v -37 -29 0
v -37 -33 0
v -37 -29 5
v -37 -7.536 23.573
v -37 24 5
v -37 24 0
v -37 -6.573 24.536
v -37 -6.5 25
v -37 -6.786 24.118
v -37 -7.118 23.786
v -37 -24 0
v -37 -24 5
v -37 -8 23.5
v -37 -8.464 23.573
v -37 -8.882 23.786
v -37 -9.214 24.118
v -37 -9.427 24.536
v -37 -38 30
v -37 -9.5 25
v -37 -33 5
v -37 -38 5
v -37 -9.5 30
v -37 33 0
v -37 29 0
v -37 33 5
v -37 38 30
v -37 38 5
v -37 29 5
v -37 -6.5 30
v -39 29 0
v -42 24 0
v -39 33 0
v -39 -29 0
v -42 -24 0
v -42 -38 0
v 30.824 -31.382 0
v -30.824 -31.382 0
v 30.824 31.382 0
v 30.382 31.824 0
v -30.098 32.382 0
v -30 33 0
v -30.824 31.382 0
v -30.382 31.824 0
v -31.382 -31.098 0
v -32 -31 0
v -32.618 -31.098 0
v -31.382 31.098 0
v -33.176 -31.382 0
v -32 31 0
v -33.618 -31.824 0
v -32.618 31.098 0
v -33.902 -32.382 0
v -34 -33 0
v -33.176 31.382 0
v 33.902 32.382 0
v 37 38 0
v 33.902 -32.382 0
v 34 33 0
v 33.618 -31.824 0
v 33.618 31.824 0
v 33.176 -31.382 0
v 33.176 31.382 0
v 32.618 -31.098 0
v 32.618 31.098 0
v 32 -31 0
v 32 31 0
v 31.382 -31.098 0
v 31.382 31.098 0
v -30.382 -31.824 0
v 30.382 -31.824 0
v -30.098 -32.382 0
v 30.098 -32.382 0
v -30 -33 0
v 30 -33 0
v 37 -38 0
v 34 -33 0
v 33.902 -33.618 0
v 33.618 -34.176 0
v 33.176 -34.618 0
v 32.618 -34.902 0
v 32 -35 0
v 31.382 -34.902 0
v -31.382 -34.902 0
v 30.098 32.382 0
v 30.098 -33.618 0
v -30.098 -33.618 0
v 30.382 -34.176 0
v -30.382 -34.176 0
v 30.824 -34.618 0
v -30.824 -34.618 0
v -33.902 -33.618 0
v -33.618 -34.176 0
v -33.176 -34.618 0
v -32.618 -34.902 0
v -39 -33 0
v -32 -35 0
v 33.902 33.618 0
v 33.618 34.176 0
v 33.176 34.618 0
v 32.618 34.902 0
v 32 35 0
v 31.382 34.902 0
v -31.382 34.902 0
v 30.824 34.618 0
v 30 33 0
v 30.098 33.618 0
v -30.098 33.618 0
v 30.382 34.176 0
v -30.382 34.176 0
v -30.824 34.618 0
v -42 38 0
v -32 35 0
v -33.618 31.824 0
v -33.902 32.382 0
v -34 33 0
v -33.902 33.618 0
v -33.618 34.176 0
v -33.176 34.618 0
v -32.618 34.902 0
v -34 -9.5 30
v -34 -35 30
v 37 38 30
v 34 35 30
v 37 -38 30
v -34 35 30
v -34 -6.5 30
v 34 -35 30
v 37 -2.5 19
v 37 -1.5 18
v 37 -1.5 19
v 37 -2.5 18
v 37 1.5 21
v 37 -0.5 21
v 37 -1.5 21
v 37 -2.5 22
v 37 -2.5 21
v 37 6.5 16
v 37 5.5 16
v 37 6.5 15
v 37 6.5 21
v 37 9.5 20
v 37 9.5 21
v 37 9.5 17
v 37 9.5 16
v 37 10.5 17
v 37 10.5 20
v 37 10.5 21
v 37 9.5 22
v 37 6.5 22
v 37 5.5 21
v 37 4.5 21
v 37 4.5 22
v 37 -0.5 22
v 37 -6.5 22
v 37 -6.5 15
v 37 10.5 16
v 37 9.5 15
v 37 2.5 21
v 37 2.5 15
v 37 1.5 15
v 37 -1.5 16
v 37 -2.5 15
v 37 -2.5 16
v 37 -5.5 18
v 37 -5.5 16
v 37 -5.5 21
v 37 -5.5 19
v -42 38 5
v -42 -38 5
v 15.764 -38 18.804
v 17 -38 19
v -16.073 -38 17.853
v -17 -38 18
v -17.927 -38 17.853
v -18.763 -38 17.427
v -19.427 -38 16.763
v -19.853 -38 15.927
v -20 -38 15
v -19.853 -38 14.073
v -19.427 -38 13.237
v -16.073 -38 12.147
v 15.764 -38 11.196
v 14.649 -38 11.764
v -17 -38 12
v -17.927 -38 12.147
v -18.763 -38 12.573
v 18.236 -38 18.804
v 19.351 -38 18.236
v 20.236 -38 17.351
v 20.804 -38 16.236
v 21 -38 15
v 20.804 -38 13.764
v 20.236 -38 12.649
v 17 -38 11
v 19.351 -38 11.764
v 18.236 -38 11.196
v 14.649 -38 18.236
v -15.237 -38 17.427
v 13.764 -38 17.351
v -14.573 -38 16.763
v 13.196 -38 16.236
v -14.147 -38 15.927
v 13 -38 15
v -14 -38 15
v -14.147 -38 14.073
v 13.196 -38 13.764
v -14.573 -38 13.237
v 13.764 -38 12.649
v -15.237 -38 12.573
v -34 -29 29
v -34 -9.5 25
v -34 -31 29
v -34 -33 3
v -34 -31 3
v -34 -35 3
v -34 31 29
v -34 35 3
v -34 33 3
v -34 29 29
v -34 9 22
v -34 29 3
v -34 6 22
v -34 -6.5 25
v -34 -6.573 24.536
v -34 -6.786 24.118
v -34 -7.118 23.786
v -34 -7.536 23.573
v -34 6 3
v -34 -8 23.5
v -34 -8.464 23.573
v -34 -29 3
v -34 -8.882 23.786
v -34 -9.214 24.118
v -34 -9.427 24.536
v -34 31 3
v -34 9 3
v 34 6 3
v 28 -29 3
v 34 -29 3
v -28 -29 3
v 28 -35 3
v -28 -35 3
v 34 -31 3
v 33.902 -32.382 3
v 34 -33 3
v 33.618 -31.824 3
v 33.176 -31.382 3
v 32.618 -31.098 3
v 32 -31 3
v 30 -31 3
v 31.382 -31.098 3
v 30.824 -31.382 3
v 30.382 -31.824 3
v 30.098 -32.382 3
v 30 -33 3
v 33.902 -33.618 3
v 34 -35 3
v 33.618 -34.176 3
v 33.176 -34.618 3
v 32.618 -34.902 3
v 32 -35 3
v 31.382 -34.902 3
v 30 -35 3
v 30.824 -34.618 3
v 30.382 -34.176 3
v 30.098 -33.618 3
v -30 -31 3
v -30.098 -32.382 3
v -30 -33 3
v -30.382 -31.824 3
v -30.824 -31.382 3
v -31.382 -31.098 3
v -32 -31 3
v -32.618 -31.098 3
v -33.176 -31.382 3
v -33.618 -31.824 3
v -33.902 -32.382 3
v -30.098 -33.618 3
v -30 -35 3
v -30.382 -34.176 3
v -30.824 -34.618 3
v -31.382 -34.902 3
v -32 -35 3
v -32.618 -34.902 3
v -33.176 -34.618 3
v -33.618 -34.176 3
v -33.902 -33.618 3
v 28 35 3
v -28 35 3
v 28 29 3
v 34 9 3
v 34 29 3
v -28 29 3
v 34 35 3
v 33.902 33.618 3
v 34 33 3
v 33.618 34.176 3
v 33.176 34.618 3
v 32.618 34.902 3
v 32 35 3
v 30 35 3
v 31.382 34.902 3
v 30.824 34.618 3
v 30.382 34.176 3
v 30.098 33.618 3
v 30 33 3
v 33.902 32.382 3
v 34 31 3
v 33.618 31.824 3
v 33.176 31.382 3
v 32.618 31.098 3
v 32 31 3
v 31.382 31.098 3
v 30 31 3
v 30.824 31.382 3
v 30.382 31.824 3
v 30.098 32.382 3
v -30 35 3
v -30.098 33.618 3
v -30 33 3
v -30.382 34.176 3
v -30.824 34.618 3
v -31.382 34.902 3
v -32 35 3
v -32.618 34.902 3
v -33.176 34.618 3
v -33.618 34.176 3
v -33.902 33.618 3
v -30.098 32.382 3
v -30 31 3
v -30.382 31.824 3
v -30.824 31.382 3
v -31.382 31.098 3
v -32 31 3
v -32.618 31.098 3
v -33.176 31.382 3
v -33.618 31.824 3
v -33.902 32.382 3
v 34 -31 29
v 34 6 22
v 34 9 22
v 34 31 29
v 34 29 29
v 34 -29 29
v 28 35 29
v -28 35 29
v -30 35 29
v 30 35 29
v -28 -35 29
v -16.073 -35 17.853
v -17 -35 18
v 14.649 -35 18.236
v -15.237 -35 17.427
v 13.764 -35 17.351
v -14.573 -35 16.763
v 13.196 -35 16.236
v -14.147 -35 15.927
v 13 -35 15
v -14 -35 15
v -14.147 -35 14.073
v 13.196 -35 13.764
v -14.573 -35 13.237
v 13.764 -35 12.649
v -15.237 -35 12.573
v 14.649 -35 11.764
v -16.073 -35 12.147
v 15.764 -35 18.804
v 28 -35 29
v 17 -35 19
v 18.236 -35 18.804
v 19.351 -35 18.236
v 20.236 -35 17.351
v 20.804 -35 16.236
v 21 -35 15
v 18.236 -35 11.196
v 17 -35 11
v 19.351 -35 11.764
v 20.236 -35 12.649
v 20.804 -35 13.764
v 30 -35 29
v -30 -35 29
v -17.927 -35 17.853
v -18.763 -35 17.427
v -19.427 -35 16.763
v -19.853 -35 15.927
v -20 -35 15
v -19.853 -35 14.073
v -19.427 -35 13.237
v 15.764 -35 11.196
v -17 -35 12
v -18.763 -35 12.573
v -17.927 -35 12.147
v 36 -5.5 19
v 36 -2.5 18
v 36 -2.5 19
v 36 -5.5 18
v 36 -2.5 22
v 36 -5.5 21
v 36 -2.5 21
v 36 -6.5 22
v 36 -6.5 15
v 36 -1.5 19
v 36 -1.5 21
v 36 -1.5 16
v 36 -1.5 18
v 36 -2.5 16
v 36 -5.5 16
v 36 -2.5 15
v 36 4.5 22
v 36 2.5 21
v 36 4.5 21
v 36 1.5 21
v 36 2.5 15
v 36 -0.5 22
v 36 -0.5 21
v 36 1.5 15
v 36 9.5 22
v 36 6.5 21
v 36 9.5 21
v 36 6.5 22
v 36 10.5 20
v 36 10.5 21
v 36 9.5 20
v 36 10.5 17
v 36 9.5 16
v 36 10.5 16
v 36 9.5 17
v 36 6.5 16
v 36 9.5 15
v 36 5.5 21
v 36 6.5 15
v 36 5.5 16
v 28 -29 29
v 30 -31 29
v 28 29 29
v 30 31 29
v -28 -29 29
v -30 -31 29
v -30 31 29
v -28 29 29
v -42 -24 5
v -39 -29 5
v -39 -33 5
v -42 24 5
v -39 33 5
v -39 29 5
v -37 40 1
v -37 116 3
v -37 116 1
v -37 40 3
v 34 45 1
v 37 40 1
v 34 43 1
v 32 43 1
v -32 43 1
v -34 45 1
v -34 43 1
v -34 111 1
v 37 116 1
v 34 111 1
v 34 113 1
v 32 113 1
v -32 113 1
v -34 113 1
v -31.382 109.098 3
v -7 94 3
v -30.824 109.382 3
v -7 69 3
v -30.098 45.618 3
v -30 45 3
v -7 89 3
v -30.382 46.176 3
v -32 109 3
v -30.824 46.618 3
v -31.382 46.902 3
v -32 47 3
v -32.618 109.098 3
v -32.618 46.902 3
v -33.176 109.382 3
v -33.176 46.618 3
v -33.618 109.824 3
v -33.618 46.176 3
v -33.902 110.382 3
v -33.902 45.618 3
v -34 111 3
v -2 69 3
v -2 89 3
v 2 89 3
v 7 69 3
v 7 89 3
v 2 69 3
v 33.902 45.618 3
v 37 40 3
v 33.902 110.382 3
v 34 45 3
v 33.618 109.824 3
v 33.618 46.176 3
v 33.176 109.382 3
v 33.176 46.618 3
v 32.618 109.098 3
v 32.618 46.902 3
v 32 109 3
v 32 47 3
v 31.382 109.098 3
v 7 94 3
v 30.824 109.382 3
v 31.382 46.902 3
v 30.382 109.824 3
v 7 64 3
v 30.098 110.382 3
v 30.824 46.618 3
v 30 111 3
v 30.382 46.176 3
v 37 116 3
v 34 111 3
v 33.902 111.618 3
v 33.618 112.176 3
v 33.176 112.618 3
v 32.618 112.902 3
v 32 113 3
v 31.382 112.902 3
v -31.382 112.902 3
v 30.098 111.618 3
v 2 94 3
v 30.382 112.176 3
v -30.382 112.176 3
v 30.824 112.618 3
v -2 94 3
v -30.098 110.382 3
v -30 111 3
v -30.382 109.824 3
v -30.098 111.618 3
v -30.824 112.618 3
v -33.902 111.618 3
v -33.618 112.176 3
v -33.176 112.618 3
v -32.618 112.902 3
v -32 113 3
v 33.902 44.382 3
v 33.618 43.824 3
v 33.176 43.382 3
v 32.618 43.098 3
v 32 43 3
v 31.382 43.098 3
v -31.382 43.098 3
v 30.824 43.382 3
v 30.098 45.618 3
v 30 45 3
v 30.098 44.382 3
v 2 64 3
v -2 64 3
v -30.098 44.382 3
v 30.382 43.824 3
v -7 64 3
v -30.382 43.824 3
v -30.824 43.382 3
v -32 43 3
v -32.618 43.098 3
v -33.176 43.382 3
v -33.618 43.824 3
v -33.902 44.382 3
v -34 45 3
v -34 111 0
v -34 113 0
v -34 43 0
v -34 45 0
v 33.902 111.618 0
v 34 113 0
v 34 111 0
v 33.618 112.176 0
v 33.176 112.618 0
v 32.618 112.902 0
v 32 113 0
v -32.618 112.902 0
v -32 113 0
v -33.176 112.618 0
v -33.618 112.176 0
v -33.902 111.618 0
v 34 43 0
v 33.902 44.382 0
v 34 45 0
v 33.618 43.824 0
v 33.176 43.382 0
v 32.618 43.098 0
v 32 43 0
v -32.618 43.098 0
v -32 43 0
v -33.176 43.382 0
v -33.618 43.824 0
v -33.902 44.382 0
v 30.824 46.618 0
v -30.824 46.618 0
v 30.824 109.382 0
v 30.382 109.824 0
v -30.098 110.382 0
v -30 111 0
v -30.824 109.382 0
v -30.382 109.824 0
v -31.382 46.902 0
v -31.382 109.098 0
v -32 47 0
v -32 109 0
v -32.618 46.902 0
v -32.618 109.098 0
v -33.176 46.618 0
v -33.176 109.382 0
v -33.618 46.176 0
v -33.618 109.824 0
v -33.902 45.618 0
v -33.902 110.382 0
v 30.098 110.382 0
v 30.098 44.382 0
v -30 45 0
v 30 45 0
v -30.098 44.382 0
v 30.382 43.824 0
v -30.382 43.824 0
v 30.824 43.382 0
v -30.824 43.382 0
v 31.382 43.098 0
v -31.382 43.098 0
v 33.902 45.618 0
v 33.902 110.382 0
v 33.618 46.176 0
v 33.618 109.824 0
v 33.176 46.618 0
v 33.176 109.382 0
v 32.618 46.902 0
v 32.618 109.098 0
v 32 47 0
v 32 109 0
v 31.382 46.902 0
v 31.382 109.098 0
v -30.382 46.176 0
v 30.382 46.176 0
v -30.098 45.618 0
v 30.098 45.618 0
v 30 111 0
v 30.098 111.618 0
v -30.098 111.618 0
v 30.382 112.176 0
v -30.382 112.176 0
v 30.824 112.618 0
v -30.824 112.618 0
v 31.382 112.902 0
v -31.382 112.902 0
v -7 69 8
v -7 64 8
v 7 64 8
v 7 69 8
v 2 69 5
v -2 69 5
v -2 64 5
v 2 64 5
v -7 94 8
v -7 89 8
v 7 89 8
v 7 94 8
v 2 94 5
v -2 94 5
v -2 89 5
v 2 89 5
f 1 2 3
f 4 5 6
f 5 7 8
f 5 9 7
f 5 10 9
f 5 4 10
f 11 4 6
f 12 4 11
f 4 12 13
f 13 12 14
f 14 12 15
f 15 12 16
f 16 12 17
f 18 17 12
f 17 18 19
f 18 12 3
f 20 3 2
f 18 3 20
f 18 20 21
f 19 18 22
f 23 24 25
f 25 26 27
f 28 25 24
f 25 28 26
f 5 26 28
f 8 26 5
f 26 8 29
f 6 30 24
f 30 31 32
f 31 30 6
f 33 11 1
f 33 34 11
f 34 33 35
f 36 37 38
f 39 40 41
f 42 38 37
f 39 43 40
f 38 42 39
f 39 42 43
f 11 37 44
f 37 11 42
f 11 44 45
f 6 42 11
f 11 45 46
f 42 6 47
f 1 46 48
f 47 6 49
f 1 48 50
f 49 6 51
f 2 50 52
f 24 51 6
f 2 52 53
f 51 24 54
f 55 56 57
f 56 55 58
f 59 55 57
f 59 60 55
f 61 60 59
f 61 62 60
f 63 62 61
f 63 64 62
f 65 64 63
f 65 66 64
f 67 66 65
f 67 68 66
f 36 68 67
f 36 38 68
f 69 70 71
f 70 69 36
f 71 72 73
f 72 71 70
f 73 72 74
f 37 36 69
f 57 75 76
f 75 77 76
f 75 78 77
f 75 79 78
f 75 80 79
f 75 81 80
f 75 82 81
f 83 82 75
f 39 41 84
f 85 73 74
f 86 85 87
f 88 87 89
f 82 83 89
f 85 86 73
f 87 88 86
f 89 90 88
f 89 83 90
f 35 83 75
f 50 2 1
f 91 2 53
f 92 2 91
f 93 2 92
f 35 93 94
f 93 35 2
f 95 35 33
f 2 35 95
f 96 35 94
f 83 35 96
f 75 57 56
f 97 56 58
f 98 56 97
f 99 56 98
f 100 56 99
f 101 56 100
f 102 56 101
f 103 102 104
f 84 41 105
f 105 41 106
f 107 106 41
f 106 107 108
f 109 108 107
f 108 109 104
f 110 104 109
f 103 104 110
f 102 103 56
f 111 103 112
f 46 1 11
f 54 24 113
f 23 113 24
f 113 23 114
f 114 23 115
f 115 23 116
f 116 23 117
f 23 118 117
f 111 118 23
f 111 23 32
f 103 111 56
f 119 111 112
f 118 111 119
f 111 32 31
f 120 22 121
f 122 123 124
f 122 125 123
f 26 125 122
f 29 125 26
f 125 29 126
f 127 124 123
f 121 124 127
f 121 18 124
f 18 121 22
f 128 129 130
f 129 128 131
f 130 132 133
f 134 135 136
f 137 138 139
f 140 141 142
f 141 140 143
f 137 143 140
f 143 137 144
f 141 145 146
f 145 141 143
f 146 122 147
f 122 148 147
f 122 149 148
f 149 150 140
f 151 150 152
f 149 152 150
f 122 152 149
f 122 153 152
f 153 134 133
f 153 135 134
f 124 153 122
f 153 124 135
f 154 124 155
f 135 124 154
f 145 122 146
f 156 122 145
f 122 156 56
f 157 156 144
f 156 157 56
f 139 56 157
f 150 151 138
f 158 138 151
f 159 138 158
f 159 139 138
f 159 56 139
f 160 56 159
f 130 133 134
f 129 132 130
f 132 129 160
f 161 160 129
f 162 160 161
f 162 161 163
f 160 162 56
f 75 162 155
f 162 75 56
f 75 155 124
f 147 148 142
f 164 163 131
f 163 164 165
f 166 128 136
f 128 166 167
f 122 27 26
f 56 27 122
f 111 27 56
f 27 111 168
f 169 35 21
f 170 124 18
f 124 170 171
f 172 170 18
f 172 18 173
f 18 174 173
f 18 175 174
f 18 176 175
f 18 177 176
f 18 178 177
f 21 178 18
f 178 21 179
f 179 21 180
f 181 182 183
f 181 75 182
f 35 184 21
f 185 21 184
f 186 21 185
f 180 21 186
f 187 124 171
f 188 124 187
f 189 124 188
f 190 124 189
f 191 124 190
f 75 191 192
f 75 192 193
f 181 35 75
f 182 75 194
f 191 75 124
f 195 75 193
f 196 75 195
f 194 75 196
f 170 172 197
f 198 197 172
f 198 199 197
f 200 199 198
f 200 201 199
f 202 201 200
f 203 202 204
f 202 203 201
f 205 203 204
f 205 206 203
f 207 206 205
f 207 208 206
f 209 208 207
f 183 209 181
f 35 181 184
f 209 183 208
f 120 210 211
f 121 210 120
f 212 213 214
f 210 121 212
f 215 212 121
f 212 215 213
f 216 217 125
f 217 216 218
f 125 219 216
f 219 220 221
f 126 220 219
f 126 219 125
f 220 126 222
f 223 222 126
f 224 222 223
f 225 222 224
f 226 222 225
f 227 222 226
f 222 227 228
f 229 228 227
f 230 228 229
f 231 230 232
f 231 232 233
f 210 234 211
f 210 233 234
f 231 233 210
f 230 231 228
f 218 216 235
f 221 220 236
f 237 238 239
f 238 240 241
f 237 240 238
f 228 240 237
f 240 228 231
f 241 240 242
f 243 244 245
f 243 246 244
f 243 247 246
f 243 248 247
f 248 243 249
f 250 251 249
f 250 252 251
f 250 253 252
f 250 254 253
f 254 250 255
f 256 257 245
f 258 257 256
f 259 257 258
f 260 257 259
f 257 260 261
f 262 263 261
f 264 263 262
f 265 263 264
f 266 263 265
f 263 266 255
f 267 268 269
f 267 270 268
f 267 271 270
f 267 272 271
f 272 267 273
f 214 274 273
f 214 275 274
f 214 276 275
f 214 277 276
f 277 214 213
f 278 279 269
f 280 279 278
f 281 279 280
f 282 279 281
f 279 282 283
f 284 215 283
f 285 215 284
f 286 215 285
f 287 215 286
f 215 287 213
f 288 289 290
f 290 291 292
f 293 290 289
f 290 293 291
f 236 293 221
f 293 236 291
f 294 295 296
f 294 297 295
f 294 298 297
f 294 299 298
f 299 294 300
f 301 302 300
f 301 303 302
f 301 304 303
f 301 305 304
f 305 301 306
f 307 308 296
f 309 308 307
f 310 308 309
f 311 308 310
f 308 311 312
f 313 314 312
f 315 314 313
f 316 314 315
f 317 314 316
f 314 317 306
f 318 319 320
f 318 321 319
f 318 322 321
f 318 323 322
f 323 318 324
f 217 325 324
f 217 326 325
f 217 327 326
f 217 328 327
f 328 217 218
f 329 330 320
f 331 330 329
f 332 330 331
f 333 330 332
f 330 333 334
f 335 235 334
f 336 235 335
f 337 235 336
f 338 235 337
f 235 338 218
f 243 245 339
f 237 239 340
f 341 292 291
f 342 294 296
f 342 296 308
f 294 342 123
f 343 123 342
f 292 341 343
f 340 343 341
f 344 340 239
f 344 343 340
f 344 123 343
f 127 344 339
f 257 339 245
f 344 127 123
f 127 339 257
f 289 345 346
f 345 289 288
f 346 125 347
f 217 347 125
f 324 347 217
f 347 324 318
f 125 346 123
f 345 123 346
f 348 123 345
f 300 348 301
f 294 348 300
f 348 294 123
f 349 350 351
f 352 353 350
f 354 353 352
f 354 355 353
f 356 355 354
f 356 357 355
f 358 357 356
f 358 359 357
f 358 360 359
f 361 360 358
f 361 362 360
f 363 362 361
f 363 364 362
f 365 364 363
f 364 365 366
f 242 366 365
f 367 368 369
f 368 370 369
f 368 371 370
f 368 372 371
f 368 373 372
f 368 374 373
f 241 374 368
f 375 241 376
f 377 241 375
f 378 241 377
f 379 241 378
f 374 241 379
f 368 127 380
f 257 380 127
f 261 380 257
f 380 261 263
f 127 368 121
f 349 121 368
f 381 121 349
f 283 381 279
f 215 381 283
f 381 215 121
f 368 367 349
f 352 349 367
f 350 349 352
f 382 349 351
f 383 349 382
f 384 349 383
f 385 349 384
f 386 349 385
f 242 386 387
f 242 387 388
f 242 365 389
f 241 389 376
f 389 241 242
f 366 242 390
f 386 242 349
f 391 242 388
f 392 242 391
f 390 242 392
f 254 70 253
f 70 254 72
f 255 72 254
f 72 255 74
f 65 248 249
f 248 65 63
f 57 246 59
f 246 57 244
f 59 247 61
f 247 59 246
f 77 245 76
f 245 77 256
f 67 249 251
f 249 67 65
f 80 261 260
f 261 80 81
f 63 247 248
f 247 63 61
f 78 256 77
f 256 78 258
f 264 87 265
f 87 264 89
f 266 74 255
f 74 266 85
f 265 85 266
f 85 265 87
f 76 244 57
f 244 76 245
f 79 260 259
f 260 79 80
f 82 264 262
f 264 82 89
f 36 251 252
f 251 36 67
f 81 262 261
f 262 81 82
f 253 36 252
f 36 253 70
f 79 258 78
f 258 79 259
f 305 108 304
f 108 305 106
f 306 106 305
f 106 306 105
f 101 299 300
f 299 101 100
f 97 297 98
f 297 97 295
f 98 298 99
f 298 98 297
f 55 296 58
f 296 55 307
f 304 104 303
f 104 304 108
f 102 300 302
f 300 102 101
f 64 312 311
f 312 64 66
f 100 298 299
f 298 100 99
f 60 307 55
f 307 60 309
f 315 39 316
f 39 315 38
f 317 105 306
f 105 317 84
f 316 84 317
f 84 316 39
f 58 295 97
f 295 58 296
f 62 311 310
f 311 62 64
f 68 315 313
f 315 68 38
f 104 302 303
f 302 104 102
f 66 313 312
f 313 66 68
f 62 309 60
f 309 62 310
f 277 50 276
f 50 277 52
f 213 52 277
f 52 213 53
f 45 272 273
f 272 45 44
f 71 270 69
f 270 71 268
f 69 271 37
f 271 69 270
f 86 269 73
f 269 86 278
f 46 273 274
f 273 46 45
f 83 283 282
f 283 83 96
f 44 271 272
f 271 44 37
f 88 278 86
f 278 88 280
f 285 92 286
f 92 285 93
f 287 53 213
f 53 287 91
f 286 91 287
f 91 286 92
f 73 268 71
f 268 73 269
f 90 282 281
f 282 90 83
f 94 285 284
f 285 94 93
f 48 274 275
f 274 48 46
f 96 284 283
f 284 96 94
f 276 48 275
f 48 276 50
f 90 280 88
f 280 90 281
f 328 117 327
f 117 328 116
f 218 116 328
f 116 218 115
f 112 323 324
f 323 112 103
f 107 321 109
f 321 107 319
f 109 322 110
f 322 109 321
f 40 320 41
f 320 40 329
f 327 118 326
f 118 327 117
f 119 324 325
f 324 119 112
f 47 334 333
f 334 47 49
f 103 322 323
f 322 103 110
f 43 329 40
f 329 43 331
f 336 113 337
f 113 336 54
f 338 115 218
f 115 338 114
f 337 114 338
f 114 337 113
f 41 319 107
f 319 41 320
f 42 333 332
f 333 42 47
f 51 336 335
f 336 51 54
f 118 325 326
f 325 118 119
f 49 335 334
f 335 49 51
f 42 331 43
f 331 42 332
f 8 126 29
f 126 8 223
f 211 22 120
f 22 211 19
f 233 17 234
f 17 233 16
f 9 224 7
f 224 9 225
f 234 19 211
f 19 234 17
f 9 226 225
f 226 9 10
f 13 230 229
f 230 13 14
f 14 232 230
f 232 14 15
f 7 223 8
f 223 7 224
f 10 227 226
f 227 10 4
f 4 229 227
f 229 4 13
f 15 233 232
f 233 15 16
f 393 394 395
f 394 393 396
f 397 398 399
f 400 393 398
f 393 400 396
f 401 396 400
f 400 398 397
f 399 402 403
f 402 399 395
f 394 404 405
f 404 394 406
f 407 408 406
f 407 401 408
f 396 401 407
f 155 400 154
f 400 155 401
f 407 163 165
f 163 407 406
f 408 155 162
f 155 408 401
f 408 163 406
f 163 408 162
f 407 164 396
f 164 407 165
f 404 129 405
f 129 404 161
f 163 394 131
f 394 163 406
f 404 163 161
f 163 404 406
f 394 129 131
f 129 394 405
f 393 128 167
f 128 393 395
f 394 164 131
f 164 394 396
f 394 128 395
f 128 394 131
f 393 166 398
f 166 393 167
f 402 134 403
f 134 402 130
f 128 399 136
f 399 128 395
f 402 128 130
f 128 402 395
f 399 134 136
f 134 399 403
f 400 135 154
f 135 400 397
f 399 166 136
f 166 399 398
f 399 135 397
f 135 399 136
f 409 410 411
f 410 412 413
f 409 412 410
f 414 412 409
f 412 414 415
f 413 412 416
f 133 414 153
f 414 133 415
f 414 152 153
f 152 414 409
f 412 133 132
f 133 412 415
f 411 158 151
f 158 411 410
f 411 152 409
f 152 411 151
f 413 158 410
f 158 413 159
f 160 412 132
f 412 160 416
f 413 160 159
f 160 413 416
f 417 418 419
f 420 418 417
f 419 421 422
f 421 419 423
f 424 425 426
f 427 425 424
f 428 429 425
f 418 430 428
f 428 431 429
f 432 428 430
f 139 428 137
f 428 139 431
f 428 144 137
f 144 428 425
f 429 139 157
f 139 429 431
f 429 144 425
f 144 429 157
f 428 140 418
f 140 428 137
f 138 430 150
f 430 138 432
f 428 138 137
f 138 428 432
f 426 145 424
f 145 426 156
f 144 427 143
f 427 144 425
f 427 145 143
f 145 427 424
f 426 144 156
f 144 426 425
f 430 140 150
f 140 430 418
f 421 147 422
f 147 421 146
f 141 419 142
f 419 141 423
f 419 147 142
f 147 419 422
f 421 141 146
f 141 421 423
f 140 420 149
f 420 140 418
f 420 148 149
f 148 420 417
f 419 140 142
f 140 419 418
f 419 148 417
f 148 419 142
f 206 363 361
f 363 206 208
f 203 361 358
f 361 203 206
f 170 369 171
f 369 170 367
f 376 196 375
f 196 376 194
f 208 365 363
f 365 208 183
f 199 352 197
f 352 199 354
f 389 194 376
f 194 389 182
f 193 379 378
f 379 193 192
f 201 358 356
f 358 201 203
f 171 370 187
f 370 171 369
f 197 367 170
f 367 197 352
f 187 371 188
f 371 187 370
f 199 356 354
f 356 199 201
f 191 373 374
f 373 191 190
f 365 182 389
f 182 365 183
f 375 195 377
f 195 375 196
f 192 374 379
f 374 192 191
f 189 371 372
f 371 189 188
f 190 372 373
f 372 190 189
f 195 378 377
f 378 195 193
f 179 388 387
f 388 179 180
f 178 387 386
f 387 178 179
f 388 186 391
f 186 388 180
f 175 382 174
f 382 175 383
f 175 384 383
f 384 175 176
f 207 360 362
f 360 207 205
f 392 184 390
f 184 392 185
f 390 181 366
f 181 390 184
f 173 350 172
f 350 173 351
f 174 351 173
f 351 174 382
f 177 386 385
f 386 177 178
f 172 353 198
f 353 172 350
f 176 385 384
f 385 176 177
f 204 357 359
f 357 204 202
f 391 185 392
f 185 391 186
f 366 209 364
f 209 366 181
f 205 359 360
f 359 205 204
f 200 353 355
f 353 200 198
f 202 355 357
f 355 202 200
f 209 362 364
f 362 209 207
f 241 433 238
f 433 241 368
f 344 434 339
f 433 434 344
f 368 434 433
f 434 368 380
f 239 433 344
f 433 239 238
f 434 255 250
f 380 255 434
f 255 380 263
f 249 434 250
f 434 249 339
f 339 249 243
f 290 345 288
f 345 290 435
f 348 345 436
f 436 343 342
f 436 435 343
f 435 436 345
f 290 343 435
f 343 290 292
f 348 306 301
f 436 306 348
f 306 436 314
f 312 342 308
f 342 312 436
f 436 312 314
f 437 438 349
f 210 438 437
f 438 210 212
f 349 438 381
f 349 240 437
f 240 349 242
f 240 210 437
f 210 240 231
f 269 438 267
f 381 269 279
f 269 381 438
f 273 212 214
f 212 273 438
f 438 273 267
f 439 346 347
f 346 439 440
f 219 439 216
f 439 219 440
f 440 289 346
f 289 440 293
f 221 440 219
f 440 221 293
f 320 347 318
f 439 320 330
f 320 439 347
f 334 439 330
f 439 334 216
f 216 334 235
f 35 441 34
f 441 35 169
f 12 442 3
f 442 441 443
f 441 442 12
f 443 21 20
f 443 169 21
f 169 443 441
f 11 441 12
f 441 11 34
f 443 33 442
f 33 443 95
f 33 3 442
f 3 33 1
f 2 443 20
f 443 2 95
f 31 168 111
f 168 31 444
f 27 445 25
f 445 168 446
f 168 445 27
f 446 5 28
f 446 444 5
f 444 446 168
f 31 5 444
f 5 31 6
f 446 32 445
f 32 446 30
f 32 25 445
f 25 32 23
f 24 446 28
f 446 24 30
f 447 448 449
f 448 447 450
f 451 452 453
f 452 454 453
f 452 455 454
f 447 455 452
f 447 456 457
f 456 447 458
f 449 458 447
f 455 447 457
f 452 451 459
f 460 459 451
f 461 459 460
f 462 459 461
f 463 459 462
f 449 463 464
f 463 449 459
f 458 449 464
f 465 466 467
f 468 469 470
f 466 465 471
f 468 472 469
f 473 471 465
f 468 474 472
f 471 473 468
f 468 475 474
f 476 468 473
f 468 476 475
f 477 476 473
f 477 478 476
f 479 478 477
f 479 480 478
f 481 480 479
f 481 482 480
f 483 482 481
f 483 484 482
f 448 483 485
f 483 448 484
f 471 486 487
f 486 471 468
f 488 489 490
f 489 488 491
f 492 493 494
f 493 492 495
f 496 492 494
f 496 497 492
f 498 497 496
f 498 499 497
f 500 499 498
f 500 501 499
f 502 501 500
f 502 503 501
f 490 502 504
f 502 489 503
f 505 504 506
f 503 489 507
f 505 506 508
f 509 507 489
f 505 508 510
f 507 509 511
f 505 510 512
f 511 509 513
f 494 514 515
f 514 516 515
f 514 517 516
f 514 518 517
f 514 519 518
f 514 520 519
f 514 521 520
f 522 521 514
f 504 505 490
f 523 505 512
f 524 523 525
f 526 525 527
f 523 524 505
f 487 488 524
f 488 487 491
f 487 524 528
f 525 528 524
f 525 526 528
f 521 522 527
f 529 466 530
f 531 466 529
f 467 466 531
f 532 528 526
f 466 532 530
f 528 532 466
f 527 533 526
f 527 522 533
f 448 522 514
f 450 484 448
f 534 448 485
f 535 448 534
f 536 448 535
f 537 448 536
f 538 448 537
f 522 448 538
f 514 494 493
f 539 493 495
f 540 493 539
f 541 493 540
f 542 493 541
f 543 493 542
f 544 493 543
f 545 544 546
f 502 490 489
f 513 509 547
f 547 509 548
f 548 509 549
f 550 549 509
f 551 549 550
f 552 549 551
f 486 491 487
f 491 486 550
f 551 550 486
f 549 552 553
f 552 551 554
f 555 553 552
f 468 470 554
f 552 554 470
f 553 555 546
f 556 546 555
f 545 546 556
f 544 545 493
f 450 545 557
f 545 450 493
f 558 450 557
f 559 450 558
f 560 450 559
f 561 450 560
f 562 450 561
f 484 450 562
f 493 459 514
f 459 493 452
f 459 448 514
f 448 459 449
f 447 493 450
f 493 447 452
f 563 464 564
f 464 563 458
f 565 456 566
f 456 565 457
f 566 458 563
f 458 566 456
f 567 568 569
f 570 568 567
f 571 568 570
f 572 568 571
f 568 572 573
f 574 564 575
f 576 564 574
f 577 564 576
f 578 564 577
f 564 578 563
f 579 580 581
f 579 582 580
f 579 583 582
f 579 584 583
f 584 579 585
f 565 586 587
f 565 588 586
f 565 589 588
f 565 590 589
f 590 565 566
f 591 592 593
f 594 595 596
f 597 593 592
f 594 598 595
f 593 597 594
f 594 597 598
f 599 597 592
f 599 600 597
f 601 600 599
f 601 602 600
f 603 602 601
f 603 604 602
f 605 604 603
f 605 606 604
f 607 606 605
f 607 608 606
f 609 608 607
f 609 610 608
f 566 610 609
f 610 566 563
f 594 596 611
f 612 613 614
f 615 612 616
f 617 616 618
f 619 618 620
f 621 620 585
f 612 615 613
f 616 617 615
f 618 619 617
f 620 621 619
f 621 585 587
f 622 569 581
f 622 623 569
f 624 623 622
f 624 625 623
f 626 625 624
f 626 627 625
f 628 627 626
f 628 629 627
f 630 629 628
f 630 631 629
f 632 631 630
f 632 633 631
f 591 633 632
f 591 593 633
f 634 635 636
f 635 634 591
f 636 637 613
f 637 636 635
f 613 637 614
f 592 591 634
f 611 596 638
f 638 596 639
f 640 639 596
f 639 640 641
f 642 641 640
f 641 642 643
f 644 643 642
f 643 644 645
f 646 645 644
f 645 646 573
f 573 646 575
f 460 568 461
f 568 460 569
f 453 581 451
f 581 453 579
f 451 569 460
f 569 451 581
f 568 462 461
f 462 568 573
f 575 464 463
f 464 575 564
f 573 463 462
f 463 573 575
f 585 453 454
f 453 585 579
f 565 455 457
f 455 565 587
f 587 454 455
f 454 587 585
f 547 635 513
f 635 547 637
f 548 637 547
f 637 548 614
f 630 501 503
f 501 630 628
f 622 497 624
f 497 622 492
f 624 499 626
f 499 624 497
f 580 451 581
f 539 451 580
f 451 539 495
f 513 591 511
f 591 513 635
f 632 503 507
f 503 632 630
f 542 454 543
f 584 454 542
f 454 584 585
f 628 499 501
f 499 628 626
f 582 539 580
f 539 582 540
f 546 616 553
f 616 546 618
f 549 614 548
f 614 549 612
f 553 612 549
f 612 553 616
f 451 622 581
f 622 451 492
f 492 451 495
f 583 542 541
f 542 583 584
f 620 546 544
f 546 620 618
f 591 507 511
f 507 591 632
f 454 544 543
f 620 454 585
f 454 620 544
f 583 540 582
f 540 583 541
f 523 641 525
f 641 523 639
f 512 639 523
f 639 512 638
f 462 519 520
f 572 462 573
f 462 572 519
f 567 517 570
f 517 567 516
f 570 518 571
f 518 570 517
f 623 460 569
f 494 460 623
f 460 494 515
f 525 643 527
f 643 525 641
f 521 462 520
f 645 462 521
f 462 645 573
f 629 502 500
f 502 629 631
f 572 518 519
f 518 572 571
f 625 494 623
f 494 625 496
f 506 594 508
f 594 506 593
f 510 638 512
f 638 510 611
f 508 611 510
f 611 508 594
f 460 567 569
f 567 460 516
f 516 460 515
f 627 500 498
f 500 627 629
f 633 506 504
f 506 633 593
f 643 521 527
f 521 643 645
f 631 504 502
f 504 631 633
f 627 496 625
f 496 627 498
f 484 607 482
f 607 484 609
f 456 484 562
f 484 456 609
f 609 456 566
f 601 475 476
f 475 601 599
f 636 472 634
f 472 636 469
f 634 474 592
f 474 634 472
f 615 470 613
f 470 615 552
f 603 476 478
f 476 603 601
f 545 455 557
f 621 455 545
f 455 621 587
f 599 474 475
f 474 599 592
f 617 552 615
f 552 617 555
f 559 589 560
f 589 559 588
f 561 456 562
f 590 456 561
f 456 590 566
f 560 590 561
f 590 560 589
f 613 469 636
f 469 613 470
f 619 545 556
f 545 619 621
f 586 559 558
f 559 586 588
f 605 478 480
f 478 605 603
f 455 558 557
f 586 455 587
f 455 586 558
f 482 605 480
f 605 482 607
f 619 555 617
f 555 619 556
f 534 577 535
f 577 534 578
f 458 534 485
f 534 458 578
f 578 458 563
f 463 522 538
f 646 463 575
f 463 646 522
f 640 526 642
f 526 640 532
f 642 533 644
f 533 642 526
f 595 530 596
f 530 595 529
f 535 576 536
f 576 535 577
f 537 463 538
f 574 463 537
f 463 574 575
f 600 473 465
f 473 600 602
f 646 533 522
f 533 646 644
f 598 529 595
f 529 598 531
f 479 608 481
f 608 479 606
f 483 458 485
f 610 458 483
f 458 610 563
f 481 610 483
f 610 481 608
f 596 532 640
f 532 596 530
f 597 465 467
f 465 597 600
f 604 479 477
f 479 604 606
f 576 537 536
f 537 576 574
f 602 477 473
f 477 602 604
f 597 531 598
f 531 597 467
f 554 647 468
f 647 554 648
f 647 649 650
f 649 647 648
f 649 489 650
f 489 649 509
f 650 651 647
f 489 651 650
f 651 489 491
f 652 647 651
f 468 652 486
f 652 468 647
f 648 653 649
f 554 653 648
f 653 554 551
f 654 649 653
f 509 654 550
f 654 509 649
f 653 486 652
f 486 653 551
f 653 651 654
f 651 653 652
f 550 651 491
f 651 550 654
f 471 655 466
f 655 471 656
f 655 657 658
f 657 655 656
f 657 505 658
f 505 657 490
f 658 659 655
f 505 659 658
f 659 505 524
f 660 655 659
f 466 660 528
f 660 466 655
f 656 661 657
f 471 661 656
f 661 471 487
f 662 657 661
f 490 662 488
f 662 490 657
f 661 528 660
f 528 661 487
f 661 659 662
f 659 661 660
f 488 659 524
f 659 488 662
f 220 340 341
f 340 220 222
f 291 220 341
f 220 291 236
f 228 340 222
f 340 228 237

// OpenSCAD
// file: text_generator.scad
module drawtext(text) {
	//Characters
	chars = " !\"#$%&'()*+,-./0123456789:;<=>?@ABCDEFGHIJKLMNOPQRSTUVWXYZ[\\]^_`abcdefghijklmnopqrstuvwxyz{|}";

	//Chracter table defining 5x7 characters
	//Adapted from: http://www.geocities.com/dinceraydin/djlcdsim/chartable.js
	char_table = [ [ 0, 0, 0, 0, 0, 0, 0],
                  [ 4, 0, 4, 4, 4, 4, 4],
                  [ 0, 0, 0, 0,10,10,10],
                  [10,10,31,10,31,10,10],
                  [ 4,30, 5,14,20,15, 4],
                  [ 3,19, 8, 4, 2,25,24],
                  [13,18,21, 8,20,18,12],
                  [ 0, 0, 0, 0, 8, 4,12],
                  [ 2, 4, 8, 8, 8, 4, 2],
                  [ 8, 4, 2, 2, 2, 4, 8],
                  [ 0, 4,21,14,21, 4, 0],
                  [ 0, 4, 4,31, 4, 4, 0],
                  [ 8, 4,12, 0, 0, 0, 0],
                  [ 0, 0, 0,31, 0, 0, 0],
                  [12,12, 0, 0, 0, 0, 0],
                  [ 0,16, 8, 4, 2, 1, 0],
                  [14,17,25,21,19,17,14],
                  [14, 4, 4, 4, 4,12, 4],
                  [31, 8, 4, 2, 1,17,14],
                  [14,17, 1, 2, 4, 2,31],
                  [ 2, 2,31,18,10, 6, 2],
                  [14,17, 1, 1,30,16,31],
                  [14,17,17,30,16, 8, 6],
                  [ 8, 8, 8, 4, 2, 1,31],
                  [14,17,17,14,17,17,14],
                  [12, 2, 1,15,17,17,14],
                  [ 0,12,12, 0,12,12, 0],
                  [ 8, 4,12, 0,12,12, 0],
                  [ 2, 4, 8,16, 8, 4, 2],
                  [ 0, 0,31, 0,31, 0, 0],
                  [16, 8, 4, 2, 4, 8,16],
                  [ 4, 0, 4, 2, 1,17,14],
                  [14,21,21,13, 1,17,14],
                  [17,17,31,17,17,17,14],
                  [30,17,17,30,17,17,30],
                  [14,17,16,16,16,17,14],
                  [30,17,17,17,17,17,30],
                  [31,16,16,30,16,16,31],
                  [16,16,16,30,16,16,31],
                  [15,17,17,23,16,17,14],
                  [17,17,17,31,17,17,17],
                  [14, 4, 4, 4, 4, 4,14],
                  [12,18, 2, 2, 2, 2, 7],
                  [17,18,20,24,20,18,17],
                  [31,16,16,16,16,16,16],
                  [17,17,17,21,21,27,17],
                  [17,17,19,21,25,17,17],
                  [14,17,17,17,17,17,14],
                  [16,16,16,30,17,17,30],
                  [13,18,21,17,17,17,14],
                  [17,18,20,30,17,17,30],
                  [30, 1, 1,14,16,16,15],
                  [ 4, 4, 4, 4, 4, 4,31],
                  [14,17,17,17,17,17,17],
                  [ 4,10,17,17,17,17,17],
                  [10,21,21,21,17,17,17],
                  [17,17,10, 4,10,17,17],
                  [ 4, 4, 4,10,17,17,17],
                  [31,16, 8, 4, 2, 1,31],
                  [14, 8, 8, 8, 8, 8,14],
                  [ 0, 1, 2, 4, 8,16, 0],
                  [14, 2, 2, 2, 2, 2,14],
                  [ 0, 0, 0, 0,17,10, 4],
                  [31, 0, 0, 0, 0, 0, 0],
                  [ 0, 0, 0, 0, 2, 4, 8],
                  [15,17,15, 1,14, 0, 0],
                  [30,17,17,25,22,16,16],
                  [14,17,16,16,14, 0, 0],
                  [15,17,17,19,13, 1, 1],
                  [14,16,31,17,14, 0, 0],
                  [ 8, 8, 8,28, 8, 9, 6],
                  [14, 1,15,17,15, 0, 0],
                  [17,17,17,25,22,16,16],
                  [14, 4, 4, 4,12, 0, 4],
                  [12,18, 2, 2, 2, 6, 2],
                  [18,20,24,20,18,16,16],
                  [14, 4, 4, 4, 4, 4,12],
                  [17,17,21,21,26, 0, 0],
                  [17,17,17,25,22, 0, 0],
                  [14,17,17,17,14, 0, 0],
                  [16,16,30,17,30, 0, 0],
                  [ 1, 1,15,19,13, 0, 0],
                  [16,16,16,25,22, 0, 0],
                  [30, 1,14,16,15, 0, 0],
                  [ 6, 9, 8, 8,28, 8, 8],
                  [13,19,17,17,17, 0, 0],
                  [ 4,10,17,17,17, 0, 0],
                  [10,21,21,17,17, 0, 0],
                  [17,10, 4,10,17, 0, 0],
                  [14, 1,15,17,17, 0, 0],
                  [31, 8, 4, 2,31, 0, 0],
                  [ 2, 4, 4, 8, 4, 4, 2],
                  [ 4, 4, 4, 4, 4, 4, 4],
                  [ 8, 4, 4, 2, 4, 4, 8] ];

	//Binary decode table
	dec_table = [ "00000", "00001", "00010", "00011", "00100", "00101",
  	            "00110", "00111", "01000", "01001", "01010", "01011",
  	            "01100", "01101", "01110", "01111", "10000", "10001",
  	            "10010", "10011", "10100", "10101", "10110", "10111",
	            "11000", "11001", "11010", "11011", "11100", "11101",
	            "11110", "11111" ];

	//Process string one character at a time
	for(itext = [0:len(text)-1]) {
		//Convert character to index
		ichar = search(text[itext],chars,1)[0];

        //Decode character - rows
        for(irow = [0:6]) {
            //Select value to draw from table
            val = dec_table[char_table[ichar][irow]];

            //Decode character - cols
            for(icol = [0:4]) {
                // Retrieve bit to draw
                bit = search(val[icol],"01",1)[0];

                if(bit) {
                    //Output cube
                    translate([icol + (6*itext), irow, 0])
                        cube([1.0001,1.0001,1]);
                }
            }
        }
	}
}
// main file
include <text_generator.scad>;

profile = 0;
showComponents = 0;

// sizes in mm
width = 74;
height = 76;
depth = 30; 
thickness = 3;
coverThickness = 2;
coverDepth = 1;
coverOffset = 0;
holeRadius = 2;

mountWidth = 14;
mountHeigth = 6;
mounthDepth = 5;

batteryHolderWidth = 55;
batteryHolderSize = 25;

controlsOffset = 20;
ledRadius = 4;//2.5;
ledXPosition = controlsOffset;
switchRadius = 3;
switchXPosition = width - controlsOffset;

holeHeigth = thickness;
bottomHoleOffset = depth - thickness;
holePosition = 2 * thickness - 1;
widthInside = width - (2 * thickness);
heightInside = height - (2 * thickness);

module box() {
    difference() {
        cube([width, height, depth], false);
        translate([thickness, thickness, -thickness]) {
            cube([widthInside, heightInside, depth], false);
        }
    }
}

module hole(x, y, z) {
    translate([x, y, z]) {
        cylinder(holeHeigth, holeRadius, holeRadius,$fn=20, false);
    }
}

module holes(bottomOffset) {
    hole(holePosition, holePosition, bottomOffset);
    hole(holePosition, heightInside + 1, bottomOffset);
    hole(widthInside + 1, holePosition, bottomOffset);
    hole(widthInside + 1, heightInside + 1, bottomOffset);
}

module holeBox(x, y) {
    translate([x, y, 1]) {
        difference() {
            cube([8, 8, depth - 1 - thickness]);
            translate([2, 2, 0]) {
                cube([4, 4, depth - 1 - thickness]);
            }
        }
    }
}

module holeBoxes() {
    holeBox(1, 1);
    holeBox(1, heightInside - thickness);
    holeBox(widthInside - thickness, 1);
    holeBox(widthInside - thickness, heightInside - thickness);
}

module cover() {
    translate([0, 0, coverOffset]) {
        cube([width, height, coverThickness], false);
        translate([thickness, thickness, coverThickness]) {
            cube([widthInside, heightInside, coverDepth], false);
        }
    }
}

module ledHoles() {
    halfDepth = depth / 2;
    translate([ledXPosition, thickness + 1, halfDepth]) {
        rotate([90, 0, 0]) {
            heigth = thickness + 2;
            cylinder(heigth, ledRadius, ledRadius,$fn=20, false);
        }
    }
}

module switchHole() {
    halfDepth = depth / 2;
    translate([switchXPosition, thickness + 1, halfDepth]) {
        rotate([90, 0, 0]) {
            heigth = thickness + 2;
            cylinder(heigth, switchRadius, switchRadius,$fn=20, false);
        }
    }
}

module mount(x) {
    translate([(width - mountWidth) / 2, x, -(coverOffset + mountHeigth - 1)]) {
        difference() {
            cube([mountWidth, mounthDepth, mountHeigth], false);
            translate([(mountWidth - 4) / 2, 0, 3]) {
                cube([4, mounthDepth, 2], false);
            }
        }
    }
}

module verticalMount(y) {
    translate([width - 1, y, depth - mounthDepth]) {
        difference() {
            cube([mountHeigth, mountWidth, mounthDepth], false);
            translate([1, (mountWidth - 4) / 2, 0]) {
                cube([2, 4, mounthDepth], false);
            }
        }
    }
}

module logo() {
    rotate([90, 180, -90]) {
        translate([31.5, -15, -1]) {
            scale([1,1,1]) drawtext("BTC");
        }
    }
}

module sensorHoles() {
    holeSize = 3;
    holeDistance = 30;
    translate([width - 3, holeDistance - holeSize/2, 0]) {
        cube([3, holeSize, 5], false);
    }
    translate([thickness, holeDistance, 5]) {
        rotate([0, 90, 0]) {
            cylinder(width, holeSize/2, holeSize/2,$fn=20, false);
        }
    }
}

module batteryHolder() {
    translate([2, height - 32, depth - 22]) {
        cube([width - 4, 3, 20]);
    }  
}

module components() {
    // battery box 55x25x25
    translate([9.5, height - 28.5, 1]) {
        cube([batteryHolderWidth, batteryHolderSize, batteryHolderSize]);
    }
    // bluno 5x30x34
    translate([10, 10, 24]) {
        cube([34, 30, 5]);
    }
}

module model() {
    difference() {
        box();
        holes(bottomHoleOffset);
        ledHoles();
        switchHole();
        sensorHoles();
        logo();
    }
    
    holeBoxes();
    verticalMount(0);
    verticalMount(height - mountWidth);
    batteryHolder();
    
    translation = profile == 1 
        ? [0, 0, -4] 
        : [0, 78, depth - thickness];
    
    translate(translation) {
        difference() {
            cover();
            holes(coverOffset);
        }
        mount(24);
        mount(49);
    }
    
    if (showComponents == 1) {
        components();
    }
}

rotate([0, 180, 0]) {
    translate([-width/2, -height/2, -depth]) {
        difference() {
            model();
            if (profile == 1) {
                translate([0, height / 2, -(depth - 10)]) {
                    cube([width / 2, height, 60], false);
                }
            }
        }
    }
}
